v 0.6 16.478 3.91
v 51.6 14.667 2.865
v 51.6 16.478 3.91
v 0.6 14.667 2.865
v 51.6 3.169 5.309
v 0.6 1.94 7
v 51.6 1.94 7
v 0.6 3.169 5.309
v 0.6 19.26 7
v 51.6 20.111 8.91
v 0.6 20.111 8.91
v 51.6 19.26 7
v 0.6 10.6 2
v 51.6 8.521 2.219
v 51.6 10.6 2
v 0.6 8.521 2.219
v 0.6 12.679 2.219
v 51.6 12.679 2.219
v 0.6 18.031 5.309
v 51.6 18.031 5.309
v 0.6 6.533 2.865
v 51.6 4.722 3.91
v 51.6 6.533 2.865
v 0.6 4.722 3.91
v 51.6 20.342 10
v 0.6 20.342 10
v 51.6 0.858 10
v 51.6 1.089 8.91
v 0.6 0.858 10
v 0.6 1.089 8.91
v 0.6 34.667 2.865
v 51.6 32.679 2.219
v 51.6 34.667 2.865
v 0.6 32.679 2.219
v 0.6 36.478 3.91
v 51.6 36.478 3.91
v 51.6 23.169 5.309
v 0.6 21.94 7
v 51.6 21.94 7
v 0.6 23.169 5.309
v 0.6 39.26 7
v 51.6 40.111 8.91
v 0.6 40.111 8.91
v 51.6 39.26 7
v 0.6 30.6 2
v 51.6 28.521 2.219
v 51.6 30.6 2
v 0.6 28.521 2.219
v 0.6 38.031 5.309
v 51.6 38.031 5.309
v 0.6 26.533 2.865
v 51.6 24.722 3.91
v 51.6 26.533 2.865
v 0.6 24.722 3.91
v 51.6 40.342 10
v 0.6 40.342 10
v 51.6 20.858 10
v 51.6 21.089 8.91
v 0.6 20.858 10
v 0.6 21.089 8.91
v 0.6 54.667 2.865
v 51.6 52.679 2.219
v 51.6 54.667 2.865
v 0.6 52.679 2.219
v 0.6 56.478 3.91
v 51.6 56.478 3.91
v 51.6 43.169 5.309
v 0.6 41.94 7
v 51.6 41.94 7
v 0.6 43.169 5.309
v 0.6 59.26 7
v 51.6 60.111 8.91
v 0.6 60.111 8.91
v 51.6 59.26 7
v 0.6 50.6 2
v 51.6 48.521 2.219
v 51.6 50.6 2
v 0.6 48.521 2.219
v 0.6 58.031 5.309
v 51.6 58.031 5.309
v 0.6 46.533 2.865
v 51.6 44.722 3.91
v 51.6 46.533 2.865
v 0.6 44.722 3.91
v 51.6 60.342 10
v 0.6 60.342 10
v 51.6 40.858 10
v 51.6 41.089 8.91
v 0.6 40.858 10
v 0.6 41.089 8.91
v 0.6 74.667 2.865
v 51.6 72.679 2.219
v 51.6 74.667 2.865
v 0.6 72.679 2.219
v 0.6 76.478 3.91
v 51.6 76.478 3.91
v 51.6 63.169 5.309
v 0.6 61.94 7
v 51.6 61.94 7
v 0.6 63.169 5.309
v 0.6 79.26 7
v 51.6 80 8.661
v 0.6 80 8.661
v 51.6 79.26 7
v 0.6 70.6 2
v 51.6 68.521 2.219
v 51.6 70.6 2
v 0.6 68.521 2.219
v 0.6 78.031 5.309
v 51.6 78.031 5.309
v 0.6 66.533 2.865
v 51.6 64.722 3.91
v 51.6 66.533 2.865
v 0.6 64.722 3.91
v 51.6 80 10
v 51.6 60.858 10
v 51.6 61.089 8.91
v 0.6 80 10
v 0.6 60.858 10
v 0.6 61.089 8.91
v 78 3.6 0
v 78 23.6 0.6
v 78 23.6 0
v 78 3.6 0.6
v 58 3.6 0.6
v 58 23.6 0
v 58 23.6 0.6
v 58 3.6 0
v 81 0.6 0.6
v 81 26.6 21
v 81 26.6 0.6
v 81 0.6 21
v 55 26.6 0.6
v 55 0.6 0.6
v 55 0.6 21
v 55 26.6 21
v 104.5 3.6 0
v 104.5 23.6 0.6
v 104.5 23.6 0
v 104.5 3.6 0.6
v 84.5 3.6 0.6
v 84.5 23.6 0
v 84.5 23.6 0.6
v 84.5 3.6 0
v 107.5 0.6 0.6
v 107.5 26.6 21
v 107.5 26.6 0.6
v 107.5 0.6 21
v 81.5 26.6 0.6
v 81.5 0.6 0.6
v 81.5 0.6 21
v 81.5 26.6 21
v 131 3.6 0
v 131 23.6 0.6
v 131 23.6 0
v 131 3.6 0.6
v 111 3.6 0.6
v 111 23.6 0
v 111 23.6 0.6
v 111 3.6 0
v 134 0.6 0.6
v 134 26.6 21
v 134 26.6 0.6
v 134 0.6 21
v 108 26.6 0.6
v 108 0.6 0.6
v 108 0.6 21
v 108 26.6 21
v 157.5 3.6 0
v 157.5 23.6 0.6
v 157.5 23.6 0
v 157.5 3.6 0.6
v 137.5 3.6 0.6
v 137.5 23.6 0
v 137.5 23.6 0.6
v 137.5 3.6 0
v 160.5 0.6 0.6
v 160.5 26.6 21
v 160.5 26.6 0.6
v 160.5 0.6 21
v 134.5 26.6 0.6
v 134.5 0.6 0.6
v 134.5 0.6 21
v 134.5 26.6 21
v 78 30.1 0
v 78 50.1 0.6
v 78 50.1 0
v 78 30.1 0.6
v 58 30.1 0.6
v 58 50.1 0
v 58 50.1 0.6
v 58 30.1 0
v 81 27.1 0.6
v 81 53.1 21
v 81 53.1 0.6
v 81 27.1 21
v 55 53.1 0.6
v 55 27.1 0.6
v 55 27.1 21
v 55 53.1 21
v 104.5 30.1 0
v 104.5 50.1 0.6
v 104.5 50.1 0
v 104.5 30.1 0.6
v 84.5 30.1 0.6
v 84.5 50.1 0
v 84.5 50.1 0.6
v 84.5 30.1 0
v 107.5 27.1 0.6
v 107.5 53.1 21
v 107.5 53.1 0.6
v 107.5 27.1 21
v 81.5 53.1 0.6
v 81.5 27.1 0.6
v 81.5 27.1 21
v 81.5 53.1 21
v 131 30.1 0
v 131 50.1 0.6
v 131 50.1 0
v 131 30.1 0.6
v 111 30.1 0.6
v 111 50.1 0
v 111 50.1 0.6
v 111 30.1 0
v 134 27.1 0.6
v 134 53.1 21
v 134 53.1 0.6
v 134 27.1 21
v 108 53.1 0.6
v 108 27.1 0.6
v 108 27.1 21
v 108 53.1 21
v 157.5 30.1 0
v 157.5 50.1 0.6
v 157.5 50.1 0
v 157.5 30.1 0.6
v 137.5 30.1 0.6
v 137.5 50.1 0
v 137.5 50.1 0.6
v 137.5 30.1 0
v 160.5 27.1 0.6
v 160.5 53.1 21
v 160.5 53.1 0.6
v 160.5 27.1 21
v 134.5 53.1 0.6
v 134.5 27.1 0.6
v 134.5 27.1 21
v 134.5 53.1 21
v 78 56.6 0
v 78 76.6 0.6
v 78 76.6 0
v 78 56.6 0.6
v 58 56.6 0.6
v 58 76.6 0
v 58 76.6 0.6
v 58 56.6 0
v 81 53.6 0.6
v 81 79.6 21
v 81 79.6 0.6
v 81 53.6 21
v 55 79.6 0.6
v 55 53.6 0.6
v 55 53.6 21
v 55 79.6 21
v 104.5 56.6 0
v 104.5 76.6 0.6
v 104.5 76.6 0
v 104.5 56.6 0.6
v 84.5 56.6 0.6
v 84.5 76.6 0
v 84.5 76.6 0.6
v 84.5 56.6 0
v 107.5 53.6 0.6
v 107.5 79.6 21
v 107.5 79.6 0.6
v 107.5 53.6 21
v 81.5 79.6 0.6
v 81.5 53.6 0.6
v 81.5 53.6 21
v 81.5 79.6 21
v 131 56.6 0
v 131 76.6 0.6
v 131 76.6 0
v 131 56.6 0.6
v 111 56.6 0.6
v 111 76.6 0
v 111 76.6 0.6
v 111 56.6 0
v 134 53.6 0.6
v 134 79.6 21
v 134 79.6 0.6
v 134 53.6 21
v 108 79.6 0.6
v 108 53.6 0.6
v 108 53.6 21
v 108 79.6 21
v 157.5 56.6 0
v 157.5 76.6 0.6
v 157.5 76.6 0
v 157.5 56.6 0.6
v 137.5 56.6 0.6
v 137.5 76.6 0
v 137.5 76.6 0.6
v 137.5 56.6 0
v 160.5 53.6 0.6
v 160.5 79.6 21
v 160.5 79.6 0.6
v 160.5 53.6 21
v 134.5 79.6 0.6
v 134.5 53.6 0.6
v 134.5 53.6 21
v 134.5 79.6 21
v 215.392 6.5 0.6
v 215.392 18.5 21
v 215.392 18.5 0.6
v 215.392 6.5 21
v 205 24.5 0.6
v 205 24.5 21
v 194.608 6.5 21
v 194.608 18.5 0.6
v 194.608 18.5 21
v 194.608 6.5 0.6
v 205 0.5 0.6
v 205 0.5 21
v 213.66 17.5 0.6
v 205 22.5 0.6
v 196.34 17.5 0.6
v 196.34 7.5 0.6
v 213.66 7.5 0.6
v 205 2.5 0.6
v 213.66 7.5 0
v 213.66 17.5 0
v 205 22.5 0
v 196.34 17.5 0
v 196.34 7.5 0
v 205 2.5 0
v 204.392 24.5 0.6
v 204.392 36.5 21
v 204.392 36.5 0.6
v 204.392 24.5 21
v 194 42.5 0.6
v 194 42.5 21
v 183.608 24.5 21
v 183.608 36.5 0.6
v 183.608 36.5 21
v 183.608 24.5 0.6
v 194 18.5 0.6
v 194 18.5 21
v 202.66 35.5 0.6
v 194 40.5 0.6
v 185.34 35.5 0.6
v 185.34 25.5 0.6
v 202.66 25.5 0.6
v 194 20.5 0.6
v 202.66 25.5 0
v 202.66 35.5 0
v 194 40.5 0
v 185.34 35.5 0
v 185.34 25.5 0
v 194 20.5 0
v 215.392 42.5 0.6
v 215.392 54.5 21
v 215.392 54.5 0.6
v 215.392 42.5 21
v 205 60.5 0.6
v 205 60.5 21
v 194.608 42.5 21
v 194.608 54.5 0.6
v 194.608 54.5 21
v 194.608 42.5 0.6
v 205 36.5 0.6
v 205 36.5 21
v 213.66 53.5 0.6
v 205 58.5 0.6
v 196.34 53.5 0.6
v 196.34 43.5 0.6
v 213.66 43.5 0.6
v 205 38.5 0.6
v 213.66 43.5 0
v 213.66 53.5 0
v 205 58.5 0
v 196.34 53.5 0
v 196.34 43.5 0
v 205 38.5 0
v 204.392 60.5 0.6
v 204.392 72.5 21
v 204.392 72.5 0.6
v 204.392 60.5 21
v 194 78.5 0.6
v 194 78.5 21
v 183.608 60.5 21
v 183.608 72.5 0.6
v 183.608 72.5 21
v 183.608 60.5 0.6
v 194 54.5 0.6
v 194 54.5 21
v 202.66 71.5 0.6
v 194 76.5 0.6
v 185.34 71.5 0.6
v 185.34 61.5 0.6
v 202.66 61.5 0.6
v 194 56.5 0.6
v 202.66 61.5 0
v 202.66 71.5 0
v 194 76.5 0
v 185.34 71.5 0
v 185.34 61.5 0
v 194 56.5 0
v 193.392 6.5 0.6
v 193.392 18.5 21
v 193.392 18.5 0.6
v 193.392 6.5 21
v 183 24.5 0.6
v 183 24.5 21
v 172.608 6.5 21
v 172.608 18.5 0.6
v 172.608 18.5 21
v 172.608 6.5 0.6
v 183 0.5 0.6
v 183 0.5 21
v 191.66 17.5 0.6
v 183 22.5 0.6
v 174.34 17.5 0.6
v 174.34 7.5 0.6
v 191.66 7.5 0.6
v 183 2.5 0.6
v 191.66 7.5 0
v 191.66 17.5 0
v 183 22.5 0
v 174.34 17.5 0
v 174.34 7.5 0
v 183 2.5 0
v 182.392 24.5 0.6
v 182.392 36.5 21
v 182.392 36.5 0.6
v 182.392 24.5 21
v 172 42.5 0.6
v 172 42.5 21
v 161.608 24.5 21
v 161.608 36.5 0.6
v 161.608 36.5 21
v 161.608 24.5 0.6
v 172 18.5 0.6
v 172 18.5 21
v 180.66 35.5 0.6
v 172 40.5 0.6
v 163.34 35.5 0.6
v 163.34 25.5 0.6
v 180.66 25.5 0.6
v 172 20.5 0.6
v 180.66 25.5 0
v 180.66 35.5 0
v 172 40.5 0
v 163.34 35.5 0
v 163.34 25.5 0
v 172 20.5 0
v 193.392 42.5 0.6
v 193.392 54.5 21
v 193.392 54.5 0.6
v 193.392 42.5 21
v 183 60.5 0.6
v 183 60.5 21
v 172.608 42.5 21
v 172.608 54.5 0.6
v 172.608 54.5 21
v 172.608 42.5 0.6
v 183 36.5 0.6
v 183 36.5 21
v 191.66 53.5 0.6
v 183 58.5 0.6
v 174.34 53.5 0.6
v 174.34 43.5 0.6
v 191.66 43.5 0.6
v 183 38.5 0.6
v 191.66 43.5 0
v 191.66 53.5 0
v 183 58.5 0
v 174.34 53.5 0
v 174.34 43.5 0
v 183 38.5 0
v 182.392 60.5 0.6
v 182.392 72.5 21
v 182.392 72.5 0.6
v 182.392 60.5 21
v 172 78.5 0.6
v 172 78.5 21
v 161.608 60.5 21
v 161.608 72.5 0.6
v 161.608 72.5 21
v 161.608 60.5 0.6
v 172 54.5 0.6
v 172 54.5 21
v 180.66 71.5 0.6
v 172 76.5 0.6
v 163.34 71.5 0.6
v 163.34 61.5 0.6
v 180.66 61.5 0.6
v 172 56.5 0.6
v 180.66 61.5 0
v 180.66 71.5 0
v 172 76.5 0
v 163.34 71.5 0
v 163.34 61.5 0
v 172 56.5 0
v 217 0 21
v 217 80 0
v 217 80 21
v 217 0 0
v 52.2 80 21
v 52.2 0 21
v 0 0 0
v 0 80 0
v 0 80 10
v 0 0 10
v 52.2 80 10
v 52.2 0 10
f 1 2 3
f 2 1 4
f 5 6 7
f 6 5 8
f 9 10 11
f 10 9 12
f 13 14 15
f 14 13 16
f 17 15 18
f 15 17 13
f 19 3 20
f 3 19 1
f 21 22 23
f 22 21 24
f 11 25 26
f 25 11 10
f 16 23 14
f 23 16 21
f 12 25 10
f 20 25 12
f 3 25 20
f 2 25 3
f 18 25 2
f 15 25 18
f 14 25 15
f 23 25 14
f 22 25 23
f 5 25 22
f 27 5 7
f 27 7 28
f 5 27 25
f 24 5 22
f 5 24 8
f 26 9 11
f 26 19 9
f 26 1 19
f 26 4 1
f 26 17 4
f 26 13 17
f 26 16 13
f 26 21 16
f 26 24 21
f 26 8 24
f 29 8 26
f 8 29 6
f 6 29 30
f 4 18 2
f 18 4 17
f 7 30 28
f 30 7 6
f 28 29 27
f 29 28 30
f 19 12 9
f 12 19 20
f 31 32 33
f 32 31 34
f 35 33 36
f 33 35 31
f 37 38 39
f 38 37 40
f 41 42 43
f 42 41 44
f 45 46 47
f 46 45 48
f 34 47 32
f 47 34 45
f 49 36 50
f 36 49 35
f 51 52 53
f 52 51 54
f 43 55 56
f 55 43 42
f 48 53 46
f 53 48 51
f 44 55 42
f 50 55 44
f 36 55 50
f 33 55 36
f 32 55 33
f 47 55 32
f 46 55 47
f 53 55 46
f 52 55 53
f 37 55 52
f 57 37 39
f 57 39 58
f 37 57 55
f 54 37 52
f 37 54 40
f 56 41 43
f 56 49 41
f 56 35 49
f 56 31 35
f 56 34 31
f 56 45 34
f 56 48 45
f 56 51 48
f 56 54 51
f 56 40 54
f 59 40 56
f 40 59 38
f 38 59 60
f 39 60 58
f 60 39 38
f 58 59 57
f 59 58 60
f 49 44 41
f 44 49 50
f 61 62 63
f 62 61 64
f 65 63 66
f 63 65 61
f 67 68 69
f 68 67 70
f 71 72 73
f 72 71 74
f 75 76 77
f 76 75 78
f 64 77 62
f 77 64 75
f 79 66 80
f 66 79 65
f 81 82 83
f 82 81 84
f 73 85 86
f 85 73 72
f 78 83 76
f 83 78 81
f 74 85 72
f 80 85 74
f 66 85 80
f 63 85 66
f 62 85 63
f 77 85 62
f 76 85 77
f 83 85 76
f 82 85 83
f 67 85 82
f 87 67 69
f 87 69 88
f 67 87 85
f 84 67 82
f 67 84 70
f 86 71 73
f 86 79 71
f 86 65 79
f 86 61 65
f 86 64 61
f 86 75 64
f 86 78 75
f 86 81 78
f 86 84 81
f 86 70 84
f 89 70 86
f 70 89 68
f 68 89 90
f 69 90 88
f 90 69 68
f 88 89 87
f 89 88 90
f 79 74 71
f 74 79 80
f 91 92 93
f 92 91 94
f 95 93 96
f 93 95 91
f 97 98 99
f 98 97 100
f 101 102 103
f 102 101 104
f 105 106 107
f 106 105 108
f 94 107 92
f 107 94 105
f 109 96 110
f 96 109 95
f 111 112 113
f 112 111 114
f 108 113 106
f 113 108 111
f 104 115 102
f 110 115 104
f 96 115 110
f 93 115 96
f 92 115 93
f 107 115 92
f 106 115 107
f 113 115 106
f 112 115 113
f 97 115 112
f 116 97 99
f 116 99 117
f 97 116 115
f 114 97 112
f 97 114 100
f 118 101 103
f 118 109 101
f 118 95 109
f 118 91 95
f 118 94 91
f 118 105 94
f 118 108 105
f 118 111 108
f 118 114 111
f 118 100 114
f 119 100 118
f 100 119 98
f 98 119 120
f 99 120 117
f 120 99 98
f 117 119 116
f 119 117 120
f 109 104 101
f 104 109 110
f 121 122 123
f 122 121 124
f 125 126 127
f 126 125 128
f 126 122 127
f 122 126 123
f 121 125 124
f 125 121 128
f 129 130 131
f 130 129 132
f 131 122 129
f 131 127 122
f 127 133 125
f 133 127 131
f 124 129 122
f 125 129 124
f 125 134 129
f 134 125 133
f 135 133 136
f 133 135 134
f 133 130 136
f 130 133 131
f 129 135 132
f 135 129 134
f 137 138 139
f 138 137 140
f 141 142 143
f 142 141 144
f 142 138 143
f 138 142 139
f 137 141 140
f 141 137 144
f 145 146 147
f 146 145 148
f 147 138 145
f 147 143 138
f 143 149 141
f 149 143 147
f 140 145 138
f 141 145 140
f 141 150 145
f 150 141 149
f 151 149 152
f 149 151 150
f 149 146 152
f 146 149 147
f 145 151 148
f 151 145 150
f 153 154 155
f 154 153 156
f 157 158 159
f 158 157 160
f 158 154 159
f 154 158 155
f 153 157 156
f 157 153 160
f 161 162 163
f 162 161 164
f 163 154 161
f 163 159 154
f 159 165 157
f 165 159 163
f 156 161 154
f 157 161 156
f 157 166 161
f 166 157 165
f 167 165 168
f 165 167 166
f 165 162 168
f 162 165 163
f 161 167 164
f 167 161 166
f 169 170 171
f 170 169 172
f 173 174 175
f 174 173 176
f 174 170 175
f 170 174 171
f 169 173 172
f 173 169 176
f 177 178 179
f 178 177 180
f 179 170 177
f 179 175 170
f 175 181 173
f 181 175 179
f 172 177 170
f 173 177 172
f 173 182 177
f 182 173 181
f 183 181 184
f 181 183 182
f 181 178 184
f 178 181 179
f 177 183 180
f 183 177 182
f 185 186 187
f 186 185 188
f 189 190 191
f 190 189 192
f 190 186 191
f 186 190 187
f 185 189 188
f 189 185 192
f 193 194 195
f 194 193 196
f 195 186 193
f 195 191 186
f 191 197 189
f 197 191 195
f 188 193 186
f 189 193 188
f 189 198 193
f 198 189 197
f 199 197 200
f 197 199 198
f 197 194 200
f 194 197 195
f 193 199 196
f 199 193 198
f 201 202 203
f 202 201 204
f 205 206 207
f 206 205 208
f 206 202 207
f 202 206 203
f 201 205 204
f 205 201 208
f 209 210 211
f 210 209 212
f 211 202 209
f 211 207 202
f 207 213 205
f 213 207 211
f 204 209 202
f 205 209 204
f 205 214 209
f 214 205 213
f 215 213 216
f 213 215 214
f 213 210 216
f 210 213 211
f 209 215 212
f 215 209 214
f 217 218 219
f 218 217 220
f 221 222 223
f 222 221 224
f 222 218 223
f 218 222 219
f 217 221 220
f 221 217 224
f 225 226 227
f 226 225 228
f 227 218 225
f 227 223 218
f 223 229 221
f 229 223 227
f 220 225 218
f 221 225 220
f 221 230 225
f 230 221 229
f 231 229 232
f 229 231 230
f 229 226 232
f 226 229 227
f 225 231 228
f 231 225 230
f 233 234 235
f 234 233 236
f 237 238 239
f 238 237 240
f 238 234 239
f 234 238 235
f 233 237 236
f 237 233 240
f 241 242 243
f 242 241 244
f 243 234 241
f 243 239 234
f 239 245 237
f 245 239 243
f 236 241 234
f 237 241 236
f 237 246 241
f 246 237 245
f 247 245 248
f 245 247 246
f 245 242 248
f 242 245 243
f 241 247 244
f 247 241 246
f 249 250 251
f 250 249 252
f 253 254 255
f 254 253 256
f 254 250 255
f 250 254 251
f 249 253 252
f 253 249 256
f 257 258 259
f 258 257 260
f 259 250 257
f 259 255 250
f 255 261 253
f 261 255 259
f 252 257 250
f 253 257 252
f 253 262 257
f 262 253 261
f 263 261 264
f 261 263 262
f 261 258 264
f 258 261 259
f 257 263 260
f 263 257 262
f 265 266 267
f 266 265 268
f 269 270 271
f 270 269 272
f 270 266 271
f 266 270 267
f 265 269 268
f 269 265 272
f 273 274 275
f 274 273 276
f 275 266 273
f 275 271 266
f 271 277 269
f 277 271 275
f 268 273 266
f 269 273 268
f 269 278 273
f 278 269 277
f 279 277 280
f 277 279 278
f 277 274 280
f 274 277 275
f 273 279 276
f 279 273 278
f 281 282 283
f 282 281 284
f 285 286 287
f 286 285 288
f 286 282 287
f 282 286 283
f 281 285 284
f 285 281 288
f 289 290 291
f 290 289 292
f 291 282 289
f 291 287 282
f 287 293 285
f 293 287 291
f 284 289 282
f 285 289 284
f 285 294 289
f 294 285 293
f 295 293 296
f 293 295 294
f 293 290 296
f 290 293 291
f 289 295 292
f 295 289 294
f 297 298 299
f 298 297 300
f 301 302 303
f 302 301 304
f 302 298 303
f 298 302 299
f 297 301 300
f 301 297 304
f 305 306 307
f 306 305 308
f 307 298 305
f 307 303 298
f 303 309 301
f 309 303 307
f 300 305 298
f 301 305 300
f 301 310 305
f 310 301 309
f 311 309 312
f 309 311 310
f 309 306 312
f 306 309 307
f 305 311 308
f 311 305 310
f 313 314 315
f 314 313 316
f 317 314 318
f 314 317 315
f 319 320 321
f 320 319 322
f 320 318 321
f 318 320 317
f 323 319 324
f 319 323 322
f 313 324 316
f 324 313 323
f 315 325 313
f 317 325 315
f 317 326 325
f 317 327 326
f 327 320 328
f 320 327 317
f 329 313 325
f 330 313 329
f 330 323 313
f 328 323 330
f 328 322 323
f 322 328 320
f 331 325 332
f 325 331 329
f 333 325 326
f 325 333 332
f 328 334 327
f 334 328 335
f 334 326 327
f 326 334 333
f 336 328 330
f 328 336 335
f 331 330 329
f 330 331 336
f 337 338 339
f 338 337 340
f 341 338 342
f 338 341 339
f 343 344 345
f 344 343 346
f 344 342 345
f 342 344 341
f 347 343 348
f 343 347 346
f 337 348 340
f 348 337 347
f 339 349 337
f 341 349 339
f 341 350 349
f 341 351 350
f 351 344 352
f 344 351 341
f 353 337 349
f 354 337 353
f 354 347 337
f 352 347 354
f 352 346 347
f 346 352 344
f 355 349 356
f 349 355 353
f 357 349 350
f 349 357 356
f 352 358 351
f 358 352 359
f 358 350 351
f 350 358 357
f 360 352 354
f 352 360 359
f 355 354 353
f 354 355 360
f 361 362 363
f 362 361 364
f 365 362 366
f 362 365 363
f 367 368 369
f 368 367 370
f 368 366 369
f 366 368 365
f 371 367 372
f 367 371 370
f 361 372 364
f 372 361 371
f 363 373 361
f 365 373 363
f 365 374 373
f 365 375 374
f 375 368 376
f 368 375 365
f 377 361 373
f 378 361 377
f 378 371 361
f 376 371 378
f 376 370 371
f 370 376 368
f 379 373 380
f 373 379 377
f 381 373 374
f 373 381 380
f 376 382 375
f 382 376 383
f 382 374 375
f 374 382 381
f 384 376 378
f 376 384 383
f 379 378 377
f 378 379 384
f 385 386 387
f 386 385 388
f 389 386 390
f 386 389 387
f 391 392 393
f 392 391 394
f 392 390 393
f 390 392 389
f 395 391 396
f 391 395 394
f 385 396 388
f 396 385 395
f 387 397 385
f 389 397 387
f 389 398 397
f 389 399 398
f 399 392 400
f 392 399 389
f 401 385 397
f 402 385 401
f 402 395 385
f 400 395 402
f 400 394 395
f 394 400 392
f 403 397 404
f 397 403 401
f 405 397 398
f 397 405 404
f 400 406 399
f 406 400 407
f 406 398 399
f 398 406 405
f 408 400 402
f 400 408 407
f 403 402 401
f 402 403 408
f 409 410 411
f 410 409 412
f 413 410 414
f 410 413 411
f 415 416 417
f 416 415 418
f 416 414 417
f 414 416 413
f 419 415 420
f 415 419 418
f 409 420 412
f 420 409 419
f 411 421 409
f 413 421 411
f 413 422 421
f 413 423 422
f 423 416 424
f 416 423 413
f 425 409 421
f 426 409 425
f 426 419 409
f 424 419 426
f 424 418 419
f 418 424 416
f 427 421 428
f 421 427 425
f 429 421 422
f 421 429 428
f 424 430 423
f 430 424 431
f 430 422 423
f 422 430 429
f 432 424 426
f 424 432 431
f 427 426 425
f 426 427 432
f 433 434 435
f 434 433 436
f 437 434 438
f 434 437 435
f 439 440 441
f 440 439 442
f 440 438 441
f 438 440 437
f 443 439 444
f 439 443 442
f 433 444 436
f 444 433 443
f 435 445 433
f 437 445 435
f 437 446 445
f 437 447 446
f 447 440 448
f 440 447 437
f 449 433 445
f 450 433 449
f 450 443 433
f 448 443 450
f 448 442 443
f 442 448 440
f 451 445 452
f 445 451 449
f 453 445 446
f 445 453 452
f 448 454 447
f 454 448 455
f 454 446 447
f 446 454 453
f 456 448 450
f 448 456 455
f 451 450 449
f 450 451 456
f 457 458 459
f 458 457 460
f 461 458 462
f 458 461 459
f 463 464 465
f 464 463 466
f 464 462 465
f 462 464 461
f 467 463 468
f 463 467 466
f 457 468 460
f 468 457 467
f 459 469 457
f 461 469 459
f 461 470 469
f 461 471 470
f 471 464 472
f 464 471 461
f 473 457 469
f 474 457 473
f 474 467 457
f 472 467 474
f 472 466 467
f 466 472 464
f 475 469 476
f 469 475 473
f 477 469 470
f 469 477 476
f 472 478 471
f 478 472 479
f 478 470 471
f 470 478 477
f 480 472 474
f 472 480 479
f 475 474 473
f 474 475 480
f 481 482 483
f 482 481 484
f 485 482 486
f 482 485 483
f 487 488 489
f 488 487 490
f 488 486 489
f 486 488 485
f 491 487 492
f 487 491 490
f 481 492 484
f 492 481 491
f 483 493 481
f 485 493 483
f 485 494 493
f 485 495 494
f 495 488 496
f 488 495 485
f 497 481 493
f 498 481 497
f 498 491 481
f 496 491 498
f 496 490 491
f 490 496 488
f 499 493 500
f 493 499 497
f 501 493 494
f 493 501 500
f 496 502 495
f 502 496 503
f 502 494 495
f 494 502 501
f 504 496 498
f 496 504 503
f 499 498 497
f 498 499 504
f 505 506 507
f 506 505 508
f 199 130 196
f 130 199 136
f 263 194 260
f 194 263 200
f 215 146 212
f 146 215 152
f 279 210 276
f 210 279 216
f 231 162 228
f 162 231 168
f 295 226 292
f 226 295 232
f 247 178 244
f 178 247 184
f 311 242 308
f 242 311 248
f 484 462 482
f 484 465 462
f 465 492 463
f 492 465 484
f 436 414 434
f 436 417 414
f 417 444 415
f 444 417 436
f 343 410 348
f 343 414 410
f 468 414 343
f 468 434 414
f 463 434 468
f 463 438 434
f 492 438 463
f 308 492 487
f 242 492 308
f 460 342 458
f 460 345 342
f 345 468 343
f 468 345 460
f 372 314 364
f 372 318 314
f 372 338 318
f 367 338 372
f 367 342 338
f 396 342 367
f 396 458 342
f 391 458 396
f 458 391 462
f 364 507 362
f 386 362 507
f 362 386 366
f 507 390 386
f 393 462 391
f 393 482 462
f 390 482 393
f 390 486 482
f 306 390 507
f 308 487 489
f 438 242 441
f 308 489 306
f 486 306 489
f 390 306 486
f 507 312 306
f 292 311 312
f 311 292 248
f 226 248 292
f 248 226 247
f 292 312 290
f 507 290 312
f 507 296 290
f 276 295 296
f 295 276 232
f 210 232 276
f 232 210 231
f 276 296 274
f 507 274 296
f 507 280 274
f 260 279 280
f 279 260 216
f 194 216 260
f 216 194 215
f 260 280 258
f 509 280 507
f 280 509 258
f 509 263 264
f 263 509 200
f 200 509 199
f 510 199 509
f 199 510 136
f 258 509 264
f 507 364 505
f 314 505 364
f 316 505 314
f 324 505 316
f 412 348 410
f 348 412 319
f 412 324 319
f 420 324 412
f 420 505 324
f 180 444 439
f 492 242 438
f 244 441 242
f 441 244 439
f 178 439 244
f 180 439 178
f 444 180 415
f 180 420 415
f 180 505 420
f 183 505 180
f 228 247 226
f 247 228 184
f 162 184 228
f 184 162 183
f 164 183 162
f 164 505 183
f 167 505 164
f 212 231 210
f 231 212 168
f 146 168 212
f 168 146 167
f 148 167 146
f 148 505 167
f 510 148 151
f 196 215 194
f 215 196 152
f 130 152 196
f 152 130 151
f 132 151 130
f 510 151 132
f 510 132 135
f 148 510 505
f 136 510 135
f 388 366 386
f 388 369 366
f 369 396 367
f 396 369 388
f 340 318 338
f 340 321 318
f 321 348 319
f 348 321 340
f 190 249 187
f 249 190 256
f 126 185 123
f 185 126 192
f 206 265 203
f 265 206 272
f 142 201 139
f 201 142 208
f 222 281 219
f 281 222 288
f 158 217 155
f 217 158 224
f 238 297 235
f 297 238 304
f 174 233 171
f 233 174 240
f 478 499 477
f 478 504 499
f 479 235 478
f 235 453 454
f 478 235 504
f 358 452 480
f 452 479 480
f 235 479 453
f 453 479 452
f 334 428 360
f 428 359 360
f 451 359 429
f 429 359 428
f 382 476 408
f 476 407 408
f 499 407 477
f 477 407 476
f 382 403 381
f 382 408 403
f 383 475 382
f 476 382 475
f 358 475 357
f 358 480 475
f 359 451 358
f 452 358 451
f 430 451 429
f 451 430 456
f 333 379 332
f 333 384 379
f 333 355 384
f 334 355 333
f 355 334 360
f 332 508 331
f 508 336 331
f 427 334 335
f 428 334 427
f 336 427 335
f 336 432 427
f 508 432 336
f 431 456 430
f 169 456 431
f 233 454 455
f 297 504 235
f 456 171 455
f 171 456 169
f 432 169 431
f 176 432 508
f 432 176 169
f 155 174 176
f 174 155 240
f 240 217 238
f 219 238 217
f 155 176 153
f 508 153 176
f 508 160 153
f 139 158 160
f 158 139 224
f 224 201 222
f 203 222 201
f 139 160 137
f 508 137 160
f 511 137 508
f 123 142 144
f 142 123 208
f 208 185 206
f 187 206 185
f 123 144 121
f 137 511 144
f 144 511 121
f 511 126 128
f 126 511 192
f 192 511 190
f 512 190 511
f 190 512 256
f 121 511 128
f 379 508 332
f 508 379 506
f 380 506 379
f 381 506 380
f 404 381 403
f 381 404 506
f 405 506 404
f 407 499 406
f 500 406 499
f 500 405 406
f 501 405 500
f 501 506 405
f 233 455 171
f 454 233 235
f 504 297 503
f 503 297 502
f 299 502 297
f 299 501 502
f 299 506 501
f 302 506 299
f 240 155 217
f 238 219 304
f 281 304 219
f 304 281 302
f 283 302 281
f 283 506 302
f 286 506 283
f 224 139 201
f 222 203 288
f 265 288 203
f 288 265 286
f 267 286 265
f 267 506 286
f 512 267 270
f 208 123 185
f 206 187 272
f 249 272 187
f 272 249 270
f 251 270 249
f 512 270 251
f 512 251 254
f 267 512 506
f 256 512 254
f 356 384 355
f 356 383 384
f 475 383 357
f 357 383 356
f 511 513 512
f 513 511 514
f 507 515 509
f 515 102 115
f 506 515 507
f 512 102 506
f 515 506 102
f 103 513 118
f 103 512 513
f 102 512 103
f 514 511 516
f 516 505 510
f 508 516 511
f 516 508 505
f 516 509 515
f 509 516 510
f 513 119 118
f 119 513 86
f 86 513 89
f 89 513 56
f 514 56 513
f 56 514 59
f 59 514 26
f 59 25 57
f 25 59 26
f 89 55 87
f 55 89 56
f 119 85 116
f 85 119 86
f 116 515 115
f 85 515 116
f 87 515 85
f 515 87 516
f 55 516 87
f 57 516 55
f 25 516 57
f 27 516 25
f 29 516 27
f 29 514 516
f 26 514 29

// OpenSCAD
// SpaceCorp

// Card tray, print 3x. The eight base game player boards fit on the left.

// card size is 63.5 x 89mm



module cardTray() {
    cw = 64.5;
    ch = 95;
    wt = 0.6;

    w = 217;
    h = 97;
    ft = 0.6;
    
    module well(xo) {
        translate([xo+wt+10,wt+10,-1]) cube([cw-20,h-20,99]);
        translate([xo+wt,wt,ft]) cube([cw,h-wt-wt,99]);
    }
    difference() {
        cube([w,h,22]);
        translate([0,0,9]) cube([w - cw - wt - wt,h,99]);
        well(0);
        well(cw+wt);
        well(w-cw-wt-wt);
        translate([wt+cw+wt+cw+wt,wt,ft]) cube([w-cw*3-wt*5,h-wt-wt,99]);
    }
}

module tokenTray() {
    module cylinder2(vec) {
        translate(vec) {
            cylinder(h=99,d=24,$fn=6);
            translate([0,0,-1]) cylinder(h=99,d=20,$fn=6);
        }
    }   
    difference() {
        cube([217,80,21]);
        for (i=[0:3])
            translate([0.6,10.6+20*i,12]) rotate([0,90,0]) cylinder(h=51,d=20);
        translate([0,0,10]) cube([51+0.6*2,99,99]);
        
        for (i=[0:2]) {
            for (j=[0:3]) {
                translate([55+j*26.5+3,0.6+i*26.5+3,-1])
                    cube([20,20,99]);
                translate([55+j*26.5,0.6+i*26.5,0.6])
                    cube([26,26,99]);
            }
        }
           
        translate([217,12.5,0]) rotate([0,0,90]) {
            cylinder2([0,12,0.6]);
            cylinder2([0+18,12+11,0.6]);
            cylinder2([0+36,12,0.6]);
            cylinder2([0+54,12+11,0.6]);
            cylinder2([0,12+22,0.6]);
            cylinder2([0+18,12+11+22,0.6]);
            cylinder2([0+36,12+22,0.6]);
            cylinder2([0+54,12+11+22,0.6]);
        }
    }
}

//cardTray();
tokenTray();


       
